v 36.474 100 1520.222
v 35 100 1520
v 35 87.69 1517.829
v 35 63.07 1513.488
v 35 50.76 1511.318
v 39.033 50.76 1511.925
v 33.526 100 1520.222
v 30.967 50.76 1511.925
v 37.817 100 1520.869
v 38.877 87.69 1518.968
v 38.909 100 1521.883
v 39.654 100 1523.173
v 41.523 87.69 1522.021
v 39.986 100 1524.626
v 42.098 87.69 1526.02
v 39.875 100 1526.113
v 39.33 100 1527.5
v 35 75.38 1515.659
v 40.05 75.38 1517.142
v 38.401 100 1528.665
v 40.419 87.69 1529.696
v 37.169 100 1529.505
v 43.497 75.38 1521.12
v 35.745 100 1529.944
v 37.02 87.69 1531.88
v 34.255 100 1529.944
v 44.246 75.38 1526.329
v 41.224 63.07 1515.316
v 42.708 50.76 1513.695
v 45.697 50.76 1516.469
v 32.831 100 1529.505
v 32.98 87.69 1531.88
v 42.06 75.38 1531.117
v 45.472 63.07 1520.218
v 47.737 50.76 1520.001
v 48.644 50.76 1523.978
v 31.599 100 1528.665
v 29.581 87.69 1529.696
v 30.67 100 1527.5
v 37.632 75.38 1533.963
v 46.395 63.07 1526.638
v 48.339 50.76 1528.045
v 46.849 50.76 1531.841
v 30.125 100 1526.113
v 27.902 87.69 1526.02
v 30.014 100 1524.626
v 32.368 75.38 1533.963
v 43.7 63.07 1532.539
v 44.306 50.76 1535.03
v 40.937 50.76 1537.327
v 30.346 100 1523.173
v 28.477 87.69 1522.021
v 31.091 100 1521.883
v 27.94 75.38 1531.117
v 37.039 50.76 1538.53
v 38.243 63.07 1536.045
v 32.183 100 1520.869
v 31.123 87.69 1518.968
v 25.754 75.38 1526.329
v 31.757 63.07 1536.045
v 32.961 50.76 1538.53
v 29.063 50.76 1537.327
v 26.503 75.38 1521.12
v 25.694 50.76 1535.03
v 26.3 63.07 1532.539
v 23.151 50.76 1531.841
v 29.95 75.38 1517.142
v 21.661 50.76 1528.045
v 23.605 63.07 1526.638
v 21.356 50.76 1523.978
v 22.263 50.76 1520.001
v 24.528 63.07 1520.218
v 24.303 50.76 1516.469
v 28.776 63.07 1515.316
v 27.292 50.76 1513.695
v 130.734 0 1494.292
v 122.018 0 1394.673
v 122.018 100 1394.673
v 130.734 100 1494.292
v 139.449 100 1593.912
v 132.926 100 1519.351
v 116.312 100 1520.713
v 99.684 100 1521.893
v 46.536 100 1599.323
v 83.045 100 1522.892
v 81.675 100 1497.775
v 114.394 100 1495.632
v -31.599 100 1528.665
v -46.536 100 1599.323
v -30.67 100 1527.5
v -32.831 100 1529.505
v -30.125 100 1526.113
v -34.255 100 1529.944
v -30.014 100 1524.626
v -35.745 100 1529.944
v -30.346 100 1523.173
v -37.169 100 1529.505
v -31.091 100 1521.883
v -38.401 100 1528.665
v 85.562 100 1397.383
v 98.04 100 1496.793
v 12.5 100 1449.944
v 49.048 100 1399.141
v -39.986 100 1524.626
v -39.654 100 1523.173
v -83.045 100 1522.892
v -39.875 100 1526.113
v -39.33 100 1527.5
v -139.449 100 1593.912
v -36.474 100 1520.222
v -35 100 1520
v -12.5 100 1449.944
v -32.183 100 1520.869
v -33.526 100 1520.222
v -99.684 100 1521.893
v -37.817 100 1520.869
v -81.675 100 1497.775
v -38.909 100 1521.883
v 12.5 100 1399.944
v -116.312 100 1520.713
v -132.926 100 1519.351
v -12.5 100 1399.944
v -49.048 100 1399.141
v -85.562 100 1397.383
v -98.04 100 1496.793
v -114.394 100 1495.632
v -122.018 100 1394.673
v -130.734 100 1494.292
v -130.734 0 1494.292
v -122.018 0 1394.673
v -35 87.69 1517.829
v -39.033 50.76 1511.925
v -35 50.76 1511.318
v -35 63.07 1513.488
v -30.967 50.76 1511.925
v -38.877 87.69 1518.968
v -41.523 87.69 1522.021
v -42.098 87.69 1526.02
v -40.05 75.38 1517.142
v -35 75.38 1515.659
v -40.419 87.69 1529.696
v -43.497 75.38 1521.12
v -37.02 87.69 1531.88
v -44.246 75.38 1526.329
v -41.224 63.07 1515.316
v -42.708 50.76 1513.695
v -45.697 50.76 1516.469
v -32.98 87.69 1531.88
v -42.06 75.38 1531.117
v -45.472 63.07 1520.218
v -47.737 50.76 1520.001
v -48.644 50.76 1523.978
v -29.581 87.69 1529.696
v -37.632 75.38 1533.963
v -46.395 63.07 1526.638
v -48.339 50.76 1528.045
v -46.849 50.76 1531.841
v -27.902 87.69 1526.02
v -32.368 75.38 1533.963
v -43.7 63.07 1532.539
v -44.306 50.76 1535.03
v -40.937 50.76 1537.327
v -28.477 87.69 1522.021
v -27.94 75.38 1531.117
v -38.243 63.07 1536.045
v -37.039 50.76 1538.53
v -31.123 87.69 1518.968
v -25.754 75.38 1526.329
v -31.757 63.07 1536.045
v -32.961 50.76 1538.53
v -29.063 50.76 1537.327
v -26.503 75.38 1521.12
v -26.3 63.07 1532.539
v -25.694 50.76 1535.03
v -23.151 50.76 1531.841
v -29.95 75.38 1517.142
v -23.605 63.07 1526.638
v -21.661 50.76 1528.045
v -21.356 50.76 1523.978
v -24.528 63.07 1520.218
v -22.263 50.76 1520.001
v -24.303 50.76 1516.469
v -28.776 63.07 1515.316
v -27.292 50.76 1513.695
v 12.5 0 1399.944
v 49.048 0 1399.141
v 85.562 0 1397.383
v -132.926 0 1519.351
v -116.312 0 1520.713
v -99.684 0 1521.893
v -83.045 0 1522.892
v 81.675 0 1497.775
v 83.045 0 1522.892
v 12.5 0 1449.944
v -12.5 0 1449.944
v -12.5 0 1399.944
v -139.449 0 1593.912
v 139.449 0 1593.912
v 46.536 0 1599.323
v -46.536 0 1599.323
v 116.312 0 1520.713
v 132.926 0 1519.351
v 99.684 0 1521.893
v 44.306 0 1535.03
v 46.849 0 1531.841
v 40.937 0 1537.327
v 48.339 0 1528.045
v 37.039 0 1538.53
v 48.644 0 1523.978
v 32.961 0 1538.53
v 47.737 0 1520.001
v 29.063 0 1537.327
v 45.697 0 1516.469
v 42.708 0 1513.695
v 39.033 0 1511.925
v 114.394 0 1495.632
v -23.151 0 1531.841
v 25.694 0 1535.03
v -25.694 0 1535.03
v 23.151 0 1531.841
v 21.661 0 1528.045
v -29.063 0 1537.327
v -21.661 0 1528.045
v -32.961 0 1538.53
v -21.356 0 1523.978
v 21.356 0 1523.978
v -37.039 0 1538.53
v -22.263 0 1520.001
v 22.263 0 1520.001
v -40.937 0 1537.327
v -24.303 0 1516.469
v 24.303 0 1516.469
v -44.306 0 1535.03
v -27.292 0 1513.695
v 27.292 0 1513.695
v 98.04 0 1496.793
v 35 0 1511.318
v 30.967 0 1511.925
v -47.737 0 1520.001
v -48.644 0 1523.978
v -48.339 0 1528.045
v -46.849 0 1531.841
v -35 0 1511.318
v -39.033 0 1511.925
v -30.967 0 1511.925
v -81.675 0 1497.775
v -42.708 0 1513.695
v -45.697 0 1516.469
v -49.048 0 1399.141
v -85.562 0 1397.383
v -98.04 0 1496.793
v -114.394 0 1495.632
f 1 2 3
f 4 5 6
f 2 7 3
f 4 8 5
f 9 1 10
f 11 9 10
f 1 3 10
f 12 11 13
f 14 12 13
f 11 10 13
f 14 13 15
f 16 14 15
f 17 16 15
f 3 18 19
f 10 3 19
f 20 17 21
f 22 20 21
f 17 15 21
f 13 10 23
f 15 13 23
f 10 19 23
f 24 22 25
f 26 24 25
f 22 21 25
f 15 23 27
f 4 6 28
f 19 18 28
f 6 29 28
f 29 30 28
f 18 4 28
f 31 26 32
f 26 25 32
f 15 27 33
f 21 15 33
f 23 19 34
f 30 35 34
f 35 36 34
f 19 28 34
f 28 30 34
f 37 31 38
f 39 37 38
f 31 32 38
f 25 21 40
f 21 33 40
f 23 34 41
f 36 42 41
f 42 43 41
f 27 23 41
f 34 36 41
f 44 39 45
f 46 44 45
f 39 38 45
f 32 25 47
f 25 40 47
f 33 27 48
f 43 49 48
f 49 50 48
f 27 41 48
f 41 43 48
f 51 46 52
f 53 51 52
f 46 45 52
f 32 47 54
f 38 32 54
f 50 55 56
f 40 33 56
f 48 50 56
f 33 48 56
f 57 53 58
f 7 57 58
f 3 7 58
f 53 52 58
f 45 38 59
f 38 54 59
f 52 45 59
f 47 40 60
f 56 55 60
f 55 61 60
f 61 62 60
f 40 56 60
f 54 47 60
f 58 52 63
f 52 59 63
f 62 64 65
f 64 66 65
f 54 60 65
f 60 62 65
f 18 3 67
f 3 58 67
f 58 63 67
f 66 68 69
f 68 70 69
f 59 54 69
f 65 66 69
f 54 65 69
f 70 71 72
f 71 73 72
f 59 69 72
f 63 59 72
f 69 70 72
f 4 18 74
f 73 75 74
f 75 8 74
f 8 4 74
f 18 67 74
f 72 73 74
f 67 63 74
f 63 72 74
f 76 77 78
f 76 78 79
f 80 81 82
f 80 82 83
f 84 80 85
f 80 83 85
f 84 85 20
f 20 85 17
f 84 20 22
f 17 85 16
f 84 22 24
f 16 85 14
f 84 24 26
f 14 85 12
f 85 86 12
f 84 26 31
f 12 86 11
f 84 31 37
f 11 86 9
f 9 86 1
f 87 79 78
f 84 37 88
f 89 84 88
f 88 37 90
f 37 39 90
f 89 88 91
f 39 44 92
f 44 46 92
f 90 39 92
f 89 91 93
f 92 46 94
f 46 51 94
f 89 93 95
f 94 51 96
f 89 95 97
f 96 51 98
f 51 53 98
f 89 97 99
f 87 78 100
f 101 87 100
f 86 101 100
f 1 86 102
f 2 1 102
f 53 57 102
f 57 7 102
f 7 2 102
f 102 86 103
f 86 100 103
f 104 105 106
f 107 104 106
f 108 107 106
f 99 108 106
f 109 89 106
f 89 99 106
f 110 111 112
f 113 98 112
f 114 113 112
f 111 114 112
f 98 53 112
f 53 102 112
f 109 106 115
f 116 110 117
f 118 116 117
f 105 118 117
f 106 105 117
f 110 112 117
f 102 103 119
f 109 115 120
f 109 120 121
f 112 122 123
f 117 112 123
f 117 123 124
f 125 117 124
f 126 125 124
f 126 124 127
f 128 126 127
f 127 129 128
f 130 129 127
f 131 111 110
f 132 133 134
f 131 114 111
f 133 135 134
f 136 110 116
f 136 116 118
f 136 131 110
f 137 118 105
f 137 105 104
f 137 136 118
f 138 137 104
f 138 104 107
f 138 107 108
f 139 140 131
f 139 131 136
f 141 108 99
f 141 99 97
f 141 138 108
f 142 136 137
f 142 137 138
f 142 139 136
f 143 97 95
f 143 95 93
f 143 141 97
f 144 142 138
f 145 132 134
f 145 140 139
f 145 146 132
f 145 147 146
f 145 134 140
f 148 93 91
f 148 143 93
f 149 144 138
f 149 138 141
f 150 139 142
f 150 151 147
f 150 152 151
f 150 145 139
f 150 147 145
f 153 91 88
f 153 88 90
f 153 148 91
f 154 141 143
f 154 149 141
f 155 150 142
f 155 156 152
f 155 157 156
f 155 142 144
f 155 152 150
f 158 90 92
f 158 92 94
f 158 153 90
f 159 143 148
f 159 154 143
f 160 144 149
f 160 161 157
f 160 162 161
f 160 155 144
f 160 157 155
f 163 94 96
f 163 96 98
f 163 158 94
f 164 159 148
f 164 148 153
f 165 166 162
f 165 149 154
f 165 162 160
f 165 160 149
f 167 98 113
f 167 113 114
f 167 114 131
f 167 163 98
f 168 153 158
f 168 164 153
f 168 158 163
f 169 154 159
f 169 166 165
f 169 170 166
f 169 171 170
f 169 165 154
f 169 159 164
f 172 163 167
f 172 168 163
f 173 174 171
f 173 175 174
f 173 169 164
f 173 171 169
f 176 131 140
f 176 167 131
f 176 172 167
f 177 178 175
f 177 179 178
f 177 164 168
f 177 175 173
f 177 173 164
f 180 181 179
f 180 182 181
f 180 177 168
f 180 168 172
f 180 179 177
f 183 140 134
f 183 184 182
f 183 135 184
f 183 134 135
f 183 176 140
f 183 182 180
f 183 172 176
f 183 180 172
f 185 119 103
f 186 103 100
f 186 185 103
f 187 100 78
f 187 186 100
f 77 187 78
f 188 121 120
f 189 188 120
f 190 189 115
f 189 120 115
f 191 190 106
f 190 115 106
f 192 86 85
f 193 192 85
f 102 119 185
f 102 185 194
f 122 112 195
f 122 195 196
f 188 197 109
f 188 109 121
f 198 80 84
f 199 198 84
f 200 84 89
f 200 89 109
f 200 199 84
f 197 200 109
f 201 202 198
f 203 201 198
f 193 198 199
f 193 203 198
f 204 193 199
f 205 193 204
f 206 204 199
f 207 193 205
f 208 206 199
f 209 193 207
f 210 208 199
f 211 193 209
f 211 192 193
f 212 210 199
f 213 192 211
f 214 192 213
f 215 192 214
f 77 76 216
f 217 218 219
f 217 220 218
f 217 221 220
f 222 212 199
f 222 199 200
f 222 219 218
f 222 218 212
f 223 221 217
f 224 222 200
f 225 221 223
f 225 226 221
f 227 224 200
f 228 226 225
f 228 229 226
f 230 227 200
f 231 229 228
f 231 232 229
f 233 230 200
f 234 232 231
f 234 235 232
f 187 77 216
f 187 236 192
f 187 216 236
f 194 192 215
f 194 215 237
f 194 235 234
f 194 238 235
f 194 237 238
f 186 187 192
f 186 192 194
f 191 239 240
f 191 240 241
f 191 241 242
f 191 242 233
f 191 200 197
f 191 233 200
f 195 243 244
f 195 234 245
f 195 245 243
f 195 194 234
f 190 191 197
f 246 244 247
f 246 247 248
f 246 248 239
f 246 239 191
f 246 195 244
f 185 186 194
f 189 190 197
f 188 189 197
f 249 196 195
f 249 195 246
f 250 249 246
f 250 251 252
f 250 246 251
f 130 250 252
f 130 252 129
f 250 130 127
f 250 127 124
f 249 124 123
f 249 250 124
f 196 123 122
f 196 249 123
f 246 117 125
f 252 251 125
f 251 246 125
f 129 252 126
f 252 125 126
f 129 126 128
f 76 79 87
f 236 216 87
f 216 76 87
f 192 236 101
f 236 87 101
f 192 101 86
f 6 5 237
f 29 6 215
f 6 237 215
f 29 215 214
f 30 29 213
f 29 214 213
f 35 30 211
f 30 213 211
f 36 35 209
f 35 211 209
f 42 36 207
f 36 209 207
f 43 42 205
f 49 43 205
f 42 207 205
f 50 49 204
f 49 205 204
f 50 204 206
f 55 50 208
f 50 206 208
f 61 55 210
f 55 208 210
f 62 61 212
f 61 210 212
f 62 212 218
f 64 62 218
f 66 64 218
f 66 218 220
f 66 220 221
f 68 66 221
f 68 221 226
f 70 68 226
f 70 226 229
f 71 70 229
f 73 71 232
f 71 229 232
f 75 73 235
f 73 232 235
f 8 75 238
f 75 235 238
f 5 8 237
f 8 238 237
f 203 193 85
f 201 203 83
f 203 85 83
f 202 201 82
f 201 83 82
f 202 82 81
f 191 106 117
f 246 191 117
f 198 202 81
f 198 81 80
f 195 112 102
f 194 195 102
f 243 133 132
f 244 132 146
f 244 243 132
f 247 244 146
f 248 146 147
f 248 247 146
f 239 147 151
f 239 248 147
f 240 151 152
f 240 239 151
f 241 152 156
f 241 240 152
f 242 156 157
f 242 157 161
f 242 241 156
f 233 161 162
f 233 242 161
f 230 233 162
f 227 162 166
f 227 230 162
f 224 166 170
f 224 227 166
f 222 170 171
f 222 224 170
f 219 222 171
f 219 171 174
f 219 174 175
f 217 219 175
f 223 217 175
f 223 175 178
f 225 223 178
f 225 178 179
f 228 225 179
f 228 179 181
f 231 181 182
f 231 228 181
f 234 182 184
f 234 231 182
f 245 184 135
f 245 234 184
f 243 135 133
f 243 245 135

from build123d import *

# Parameters (mm, degrees)
EXTRUDE_1_DEPTH     = 100
CUT_EXTRUDE_2_DEPTH = 1610.175588972
CUT_EXTRUDE_3_DEPTH = 1610.175588972


with BuildPart() as part:
    # 草图3 → 凸台-拉伸1 (new body)
    with BuildSketch(Plane(origin=(0, 0, 0), x_dir=(1, 0, 0), z_dir=(0, 1, 0))):
        with BuildLine():
            Line((-139.449188396, -1593.911516947), (-122.018039847, -1394.672577328))
            ThreePointArc((-122.018039847, -1394.672577328), (0, -1400), (122.018039847, -1394.672577328))
            Line((122.018039847, -1394.672577328), (139.449188396, -1593.911516947))
            ThreePointArc((139.449188396, -1593.911516947), (0, -1600), (-139.449188396, -1593.911516947))
        make_face()
    extrude(amount=EXTRUDE_1_DEPTH)

    # 草图6 → 切除-拉伸2 (cut, through all)
    with BuildSketch(Plane(origin=(0, 100, 0), x_dir=(1, 0, 0), z_dir=(0, 1, 0))):
        Polygon((-12.5, -1399.944195316), (12.5, -1399.944195316), (12.5, -1449.944195316), (0, -1449.944195316), (-12.5, -1449.944195316), align=None)
    extrude(amount=-CUT_EXTRUDE_2_DEPTH, mode=Mode.SUBTRACT)

    # 草图8 → 切除-旋转1 (revolve, cut)
    with BuildSketch(Plane(origin=(-35, 0, 0), x_dir=(0, 0, -1), z_dir=(1, 0, 0)), mode=Mode.PRIVATE) as cut_revolve_1_sk:
        Polygon((-1525, 100), (-1530, 100), (-1538.682408883, 50.759612349), (-1538.682408883, 0), (-1525, 0), align=None)
    cut_revolve_1 = revolve(cut_revolve_1_sk.sketch.rotate(Axis((-35, 0, 1525), (0, 1, 0)), 180), axis=Axis((-35, 0, 1525), (0, 1, 0)), mode=Mode.SUBTRACT)

    # 镜向1: 切除-旋转1 across plane
    add(cut_revolve_1.mirror(Plane.ZY), mode=Mode.SUBTRACT)

    # 草图9 → 切除-拉伸3 (cut, through all)
    with BuildSketch(Plane(origin=(0, 100, 0), x_dir=(1, 0, 0), z_dir=(0, 1, 0))):
        with BuildLine():
            Line((81.67512146, -1497.774740919), (83.044783982, -1522.891886672))
            ThreePointArc((83.044783982, -1522.891886672), (107.999891135, -1521.325789617), (132.925969989, -1519.350789364))
            Line((132.925969989, -1519.350789364), (130.733614121, -1494.292047138))
            ThreePointArc((130.733614121, -1494.292047138), (106.218642558, -1496.234473595), (81.67512146, -1497.774740919))
        make_face()
        with BuildLine():
            Line((-83.044783982, -1522.891886672), (-81.67512146, -1497.774740919))
            ThreePointArc((-81.67512146, -1497.774740919), (-106.218642558, -1496.234473595), (-130.733614121, -1494.292047138))
            Line((-130.733614121, -1494.292047138), (-132.925969989, -1519.350789364))
            ThreePointArc((-132.925969989, -1519.350789364), (-107.999891135, -1521.325789617), (-83.044783982, -1522.891886672))
        make_face()
    extrude(amount=-CUT_EXTRUDE_3_DEPTH, mode=Mode.SUBTRACT)


solid = part.part
